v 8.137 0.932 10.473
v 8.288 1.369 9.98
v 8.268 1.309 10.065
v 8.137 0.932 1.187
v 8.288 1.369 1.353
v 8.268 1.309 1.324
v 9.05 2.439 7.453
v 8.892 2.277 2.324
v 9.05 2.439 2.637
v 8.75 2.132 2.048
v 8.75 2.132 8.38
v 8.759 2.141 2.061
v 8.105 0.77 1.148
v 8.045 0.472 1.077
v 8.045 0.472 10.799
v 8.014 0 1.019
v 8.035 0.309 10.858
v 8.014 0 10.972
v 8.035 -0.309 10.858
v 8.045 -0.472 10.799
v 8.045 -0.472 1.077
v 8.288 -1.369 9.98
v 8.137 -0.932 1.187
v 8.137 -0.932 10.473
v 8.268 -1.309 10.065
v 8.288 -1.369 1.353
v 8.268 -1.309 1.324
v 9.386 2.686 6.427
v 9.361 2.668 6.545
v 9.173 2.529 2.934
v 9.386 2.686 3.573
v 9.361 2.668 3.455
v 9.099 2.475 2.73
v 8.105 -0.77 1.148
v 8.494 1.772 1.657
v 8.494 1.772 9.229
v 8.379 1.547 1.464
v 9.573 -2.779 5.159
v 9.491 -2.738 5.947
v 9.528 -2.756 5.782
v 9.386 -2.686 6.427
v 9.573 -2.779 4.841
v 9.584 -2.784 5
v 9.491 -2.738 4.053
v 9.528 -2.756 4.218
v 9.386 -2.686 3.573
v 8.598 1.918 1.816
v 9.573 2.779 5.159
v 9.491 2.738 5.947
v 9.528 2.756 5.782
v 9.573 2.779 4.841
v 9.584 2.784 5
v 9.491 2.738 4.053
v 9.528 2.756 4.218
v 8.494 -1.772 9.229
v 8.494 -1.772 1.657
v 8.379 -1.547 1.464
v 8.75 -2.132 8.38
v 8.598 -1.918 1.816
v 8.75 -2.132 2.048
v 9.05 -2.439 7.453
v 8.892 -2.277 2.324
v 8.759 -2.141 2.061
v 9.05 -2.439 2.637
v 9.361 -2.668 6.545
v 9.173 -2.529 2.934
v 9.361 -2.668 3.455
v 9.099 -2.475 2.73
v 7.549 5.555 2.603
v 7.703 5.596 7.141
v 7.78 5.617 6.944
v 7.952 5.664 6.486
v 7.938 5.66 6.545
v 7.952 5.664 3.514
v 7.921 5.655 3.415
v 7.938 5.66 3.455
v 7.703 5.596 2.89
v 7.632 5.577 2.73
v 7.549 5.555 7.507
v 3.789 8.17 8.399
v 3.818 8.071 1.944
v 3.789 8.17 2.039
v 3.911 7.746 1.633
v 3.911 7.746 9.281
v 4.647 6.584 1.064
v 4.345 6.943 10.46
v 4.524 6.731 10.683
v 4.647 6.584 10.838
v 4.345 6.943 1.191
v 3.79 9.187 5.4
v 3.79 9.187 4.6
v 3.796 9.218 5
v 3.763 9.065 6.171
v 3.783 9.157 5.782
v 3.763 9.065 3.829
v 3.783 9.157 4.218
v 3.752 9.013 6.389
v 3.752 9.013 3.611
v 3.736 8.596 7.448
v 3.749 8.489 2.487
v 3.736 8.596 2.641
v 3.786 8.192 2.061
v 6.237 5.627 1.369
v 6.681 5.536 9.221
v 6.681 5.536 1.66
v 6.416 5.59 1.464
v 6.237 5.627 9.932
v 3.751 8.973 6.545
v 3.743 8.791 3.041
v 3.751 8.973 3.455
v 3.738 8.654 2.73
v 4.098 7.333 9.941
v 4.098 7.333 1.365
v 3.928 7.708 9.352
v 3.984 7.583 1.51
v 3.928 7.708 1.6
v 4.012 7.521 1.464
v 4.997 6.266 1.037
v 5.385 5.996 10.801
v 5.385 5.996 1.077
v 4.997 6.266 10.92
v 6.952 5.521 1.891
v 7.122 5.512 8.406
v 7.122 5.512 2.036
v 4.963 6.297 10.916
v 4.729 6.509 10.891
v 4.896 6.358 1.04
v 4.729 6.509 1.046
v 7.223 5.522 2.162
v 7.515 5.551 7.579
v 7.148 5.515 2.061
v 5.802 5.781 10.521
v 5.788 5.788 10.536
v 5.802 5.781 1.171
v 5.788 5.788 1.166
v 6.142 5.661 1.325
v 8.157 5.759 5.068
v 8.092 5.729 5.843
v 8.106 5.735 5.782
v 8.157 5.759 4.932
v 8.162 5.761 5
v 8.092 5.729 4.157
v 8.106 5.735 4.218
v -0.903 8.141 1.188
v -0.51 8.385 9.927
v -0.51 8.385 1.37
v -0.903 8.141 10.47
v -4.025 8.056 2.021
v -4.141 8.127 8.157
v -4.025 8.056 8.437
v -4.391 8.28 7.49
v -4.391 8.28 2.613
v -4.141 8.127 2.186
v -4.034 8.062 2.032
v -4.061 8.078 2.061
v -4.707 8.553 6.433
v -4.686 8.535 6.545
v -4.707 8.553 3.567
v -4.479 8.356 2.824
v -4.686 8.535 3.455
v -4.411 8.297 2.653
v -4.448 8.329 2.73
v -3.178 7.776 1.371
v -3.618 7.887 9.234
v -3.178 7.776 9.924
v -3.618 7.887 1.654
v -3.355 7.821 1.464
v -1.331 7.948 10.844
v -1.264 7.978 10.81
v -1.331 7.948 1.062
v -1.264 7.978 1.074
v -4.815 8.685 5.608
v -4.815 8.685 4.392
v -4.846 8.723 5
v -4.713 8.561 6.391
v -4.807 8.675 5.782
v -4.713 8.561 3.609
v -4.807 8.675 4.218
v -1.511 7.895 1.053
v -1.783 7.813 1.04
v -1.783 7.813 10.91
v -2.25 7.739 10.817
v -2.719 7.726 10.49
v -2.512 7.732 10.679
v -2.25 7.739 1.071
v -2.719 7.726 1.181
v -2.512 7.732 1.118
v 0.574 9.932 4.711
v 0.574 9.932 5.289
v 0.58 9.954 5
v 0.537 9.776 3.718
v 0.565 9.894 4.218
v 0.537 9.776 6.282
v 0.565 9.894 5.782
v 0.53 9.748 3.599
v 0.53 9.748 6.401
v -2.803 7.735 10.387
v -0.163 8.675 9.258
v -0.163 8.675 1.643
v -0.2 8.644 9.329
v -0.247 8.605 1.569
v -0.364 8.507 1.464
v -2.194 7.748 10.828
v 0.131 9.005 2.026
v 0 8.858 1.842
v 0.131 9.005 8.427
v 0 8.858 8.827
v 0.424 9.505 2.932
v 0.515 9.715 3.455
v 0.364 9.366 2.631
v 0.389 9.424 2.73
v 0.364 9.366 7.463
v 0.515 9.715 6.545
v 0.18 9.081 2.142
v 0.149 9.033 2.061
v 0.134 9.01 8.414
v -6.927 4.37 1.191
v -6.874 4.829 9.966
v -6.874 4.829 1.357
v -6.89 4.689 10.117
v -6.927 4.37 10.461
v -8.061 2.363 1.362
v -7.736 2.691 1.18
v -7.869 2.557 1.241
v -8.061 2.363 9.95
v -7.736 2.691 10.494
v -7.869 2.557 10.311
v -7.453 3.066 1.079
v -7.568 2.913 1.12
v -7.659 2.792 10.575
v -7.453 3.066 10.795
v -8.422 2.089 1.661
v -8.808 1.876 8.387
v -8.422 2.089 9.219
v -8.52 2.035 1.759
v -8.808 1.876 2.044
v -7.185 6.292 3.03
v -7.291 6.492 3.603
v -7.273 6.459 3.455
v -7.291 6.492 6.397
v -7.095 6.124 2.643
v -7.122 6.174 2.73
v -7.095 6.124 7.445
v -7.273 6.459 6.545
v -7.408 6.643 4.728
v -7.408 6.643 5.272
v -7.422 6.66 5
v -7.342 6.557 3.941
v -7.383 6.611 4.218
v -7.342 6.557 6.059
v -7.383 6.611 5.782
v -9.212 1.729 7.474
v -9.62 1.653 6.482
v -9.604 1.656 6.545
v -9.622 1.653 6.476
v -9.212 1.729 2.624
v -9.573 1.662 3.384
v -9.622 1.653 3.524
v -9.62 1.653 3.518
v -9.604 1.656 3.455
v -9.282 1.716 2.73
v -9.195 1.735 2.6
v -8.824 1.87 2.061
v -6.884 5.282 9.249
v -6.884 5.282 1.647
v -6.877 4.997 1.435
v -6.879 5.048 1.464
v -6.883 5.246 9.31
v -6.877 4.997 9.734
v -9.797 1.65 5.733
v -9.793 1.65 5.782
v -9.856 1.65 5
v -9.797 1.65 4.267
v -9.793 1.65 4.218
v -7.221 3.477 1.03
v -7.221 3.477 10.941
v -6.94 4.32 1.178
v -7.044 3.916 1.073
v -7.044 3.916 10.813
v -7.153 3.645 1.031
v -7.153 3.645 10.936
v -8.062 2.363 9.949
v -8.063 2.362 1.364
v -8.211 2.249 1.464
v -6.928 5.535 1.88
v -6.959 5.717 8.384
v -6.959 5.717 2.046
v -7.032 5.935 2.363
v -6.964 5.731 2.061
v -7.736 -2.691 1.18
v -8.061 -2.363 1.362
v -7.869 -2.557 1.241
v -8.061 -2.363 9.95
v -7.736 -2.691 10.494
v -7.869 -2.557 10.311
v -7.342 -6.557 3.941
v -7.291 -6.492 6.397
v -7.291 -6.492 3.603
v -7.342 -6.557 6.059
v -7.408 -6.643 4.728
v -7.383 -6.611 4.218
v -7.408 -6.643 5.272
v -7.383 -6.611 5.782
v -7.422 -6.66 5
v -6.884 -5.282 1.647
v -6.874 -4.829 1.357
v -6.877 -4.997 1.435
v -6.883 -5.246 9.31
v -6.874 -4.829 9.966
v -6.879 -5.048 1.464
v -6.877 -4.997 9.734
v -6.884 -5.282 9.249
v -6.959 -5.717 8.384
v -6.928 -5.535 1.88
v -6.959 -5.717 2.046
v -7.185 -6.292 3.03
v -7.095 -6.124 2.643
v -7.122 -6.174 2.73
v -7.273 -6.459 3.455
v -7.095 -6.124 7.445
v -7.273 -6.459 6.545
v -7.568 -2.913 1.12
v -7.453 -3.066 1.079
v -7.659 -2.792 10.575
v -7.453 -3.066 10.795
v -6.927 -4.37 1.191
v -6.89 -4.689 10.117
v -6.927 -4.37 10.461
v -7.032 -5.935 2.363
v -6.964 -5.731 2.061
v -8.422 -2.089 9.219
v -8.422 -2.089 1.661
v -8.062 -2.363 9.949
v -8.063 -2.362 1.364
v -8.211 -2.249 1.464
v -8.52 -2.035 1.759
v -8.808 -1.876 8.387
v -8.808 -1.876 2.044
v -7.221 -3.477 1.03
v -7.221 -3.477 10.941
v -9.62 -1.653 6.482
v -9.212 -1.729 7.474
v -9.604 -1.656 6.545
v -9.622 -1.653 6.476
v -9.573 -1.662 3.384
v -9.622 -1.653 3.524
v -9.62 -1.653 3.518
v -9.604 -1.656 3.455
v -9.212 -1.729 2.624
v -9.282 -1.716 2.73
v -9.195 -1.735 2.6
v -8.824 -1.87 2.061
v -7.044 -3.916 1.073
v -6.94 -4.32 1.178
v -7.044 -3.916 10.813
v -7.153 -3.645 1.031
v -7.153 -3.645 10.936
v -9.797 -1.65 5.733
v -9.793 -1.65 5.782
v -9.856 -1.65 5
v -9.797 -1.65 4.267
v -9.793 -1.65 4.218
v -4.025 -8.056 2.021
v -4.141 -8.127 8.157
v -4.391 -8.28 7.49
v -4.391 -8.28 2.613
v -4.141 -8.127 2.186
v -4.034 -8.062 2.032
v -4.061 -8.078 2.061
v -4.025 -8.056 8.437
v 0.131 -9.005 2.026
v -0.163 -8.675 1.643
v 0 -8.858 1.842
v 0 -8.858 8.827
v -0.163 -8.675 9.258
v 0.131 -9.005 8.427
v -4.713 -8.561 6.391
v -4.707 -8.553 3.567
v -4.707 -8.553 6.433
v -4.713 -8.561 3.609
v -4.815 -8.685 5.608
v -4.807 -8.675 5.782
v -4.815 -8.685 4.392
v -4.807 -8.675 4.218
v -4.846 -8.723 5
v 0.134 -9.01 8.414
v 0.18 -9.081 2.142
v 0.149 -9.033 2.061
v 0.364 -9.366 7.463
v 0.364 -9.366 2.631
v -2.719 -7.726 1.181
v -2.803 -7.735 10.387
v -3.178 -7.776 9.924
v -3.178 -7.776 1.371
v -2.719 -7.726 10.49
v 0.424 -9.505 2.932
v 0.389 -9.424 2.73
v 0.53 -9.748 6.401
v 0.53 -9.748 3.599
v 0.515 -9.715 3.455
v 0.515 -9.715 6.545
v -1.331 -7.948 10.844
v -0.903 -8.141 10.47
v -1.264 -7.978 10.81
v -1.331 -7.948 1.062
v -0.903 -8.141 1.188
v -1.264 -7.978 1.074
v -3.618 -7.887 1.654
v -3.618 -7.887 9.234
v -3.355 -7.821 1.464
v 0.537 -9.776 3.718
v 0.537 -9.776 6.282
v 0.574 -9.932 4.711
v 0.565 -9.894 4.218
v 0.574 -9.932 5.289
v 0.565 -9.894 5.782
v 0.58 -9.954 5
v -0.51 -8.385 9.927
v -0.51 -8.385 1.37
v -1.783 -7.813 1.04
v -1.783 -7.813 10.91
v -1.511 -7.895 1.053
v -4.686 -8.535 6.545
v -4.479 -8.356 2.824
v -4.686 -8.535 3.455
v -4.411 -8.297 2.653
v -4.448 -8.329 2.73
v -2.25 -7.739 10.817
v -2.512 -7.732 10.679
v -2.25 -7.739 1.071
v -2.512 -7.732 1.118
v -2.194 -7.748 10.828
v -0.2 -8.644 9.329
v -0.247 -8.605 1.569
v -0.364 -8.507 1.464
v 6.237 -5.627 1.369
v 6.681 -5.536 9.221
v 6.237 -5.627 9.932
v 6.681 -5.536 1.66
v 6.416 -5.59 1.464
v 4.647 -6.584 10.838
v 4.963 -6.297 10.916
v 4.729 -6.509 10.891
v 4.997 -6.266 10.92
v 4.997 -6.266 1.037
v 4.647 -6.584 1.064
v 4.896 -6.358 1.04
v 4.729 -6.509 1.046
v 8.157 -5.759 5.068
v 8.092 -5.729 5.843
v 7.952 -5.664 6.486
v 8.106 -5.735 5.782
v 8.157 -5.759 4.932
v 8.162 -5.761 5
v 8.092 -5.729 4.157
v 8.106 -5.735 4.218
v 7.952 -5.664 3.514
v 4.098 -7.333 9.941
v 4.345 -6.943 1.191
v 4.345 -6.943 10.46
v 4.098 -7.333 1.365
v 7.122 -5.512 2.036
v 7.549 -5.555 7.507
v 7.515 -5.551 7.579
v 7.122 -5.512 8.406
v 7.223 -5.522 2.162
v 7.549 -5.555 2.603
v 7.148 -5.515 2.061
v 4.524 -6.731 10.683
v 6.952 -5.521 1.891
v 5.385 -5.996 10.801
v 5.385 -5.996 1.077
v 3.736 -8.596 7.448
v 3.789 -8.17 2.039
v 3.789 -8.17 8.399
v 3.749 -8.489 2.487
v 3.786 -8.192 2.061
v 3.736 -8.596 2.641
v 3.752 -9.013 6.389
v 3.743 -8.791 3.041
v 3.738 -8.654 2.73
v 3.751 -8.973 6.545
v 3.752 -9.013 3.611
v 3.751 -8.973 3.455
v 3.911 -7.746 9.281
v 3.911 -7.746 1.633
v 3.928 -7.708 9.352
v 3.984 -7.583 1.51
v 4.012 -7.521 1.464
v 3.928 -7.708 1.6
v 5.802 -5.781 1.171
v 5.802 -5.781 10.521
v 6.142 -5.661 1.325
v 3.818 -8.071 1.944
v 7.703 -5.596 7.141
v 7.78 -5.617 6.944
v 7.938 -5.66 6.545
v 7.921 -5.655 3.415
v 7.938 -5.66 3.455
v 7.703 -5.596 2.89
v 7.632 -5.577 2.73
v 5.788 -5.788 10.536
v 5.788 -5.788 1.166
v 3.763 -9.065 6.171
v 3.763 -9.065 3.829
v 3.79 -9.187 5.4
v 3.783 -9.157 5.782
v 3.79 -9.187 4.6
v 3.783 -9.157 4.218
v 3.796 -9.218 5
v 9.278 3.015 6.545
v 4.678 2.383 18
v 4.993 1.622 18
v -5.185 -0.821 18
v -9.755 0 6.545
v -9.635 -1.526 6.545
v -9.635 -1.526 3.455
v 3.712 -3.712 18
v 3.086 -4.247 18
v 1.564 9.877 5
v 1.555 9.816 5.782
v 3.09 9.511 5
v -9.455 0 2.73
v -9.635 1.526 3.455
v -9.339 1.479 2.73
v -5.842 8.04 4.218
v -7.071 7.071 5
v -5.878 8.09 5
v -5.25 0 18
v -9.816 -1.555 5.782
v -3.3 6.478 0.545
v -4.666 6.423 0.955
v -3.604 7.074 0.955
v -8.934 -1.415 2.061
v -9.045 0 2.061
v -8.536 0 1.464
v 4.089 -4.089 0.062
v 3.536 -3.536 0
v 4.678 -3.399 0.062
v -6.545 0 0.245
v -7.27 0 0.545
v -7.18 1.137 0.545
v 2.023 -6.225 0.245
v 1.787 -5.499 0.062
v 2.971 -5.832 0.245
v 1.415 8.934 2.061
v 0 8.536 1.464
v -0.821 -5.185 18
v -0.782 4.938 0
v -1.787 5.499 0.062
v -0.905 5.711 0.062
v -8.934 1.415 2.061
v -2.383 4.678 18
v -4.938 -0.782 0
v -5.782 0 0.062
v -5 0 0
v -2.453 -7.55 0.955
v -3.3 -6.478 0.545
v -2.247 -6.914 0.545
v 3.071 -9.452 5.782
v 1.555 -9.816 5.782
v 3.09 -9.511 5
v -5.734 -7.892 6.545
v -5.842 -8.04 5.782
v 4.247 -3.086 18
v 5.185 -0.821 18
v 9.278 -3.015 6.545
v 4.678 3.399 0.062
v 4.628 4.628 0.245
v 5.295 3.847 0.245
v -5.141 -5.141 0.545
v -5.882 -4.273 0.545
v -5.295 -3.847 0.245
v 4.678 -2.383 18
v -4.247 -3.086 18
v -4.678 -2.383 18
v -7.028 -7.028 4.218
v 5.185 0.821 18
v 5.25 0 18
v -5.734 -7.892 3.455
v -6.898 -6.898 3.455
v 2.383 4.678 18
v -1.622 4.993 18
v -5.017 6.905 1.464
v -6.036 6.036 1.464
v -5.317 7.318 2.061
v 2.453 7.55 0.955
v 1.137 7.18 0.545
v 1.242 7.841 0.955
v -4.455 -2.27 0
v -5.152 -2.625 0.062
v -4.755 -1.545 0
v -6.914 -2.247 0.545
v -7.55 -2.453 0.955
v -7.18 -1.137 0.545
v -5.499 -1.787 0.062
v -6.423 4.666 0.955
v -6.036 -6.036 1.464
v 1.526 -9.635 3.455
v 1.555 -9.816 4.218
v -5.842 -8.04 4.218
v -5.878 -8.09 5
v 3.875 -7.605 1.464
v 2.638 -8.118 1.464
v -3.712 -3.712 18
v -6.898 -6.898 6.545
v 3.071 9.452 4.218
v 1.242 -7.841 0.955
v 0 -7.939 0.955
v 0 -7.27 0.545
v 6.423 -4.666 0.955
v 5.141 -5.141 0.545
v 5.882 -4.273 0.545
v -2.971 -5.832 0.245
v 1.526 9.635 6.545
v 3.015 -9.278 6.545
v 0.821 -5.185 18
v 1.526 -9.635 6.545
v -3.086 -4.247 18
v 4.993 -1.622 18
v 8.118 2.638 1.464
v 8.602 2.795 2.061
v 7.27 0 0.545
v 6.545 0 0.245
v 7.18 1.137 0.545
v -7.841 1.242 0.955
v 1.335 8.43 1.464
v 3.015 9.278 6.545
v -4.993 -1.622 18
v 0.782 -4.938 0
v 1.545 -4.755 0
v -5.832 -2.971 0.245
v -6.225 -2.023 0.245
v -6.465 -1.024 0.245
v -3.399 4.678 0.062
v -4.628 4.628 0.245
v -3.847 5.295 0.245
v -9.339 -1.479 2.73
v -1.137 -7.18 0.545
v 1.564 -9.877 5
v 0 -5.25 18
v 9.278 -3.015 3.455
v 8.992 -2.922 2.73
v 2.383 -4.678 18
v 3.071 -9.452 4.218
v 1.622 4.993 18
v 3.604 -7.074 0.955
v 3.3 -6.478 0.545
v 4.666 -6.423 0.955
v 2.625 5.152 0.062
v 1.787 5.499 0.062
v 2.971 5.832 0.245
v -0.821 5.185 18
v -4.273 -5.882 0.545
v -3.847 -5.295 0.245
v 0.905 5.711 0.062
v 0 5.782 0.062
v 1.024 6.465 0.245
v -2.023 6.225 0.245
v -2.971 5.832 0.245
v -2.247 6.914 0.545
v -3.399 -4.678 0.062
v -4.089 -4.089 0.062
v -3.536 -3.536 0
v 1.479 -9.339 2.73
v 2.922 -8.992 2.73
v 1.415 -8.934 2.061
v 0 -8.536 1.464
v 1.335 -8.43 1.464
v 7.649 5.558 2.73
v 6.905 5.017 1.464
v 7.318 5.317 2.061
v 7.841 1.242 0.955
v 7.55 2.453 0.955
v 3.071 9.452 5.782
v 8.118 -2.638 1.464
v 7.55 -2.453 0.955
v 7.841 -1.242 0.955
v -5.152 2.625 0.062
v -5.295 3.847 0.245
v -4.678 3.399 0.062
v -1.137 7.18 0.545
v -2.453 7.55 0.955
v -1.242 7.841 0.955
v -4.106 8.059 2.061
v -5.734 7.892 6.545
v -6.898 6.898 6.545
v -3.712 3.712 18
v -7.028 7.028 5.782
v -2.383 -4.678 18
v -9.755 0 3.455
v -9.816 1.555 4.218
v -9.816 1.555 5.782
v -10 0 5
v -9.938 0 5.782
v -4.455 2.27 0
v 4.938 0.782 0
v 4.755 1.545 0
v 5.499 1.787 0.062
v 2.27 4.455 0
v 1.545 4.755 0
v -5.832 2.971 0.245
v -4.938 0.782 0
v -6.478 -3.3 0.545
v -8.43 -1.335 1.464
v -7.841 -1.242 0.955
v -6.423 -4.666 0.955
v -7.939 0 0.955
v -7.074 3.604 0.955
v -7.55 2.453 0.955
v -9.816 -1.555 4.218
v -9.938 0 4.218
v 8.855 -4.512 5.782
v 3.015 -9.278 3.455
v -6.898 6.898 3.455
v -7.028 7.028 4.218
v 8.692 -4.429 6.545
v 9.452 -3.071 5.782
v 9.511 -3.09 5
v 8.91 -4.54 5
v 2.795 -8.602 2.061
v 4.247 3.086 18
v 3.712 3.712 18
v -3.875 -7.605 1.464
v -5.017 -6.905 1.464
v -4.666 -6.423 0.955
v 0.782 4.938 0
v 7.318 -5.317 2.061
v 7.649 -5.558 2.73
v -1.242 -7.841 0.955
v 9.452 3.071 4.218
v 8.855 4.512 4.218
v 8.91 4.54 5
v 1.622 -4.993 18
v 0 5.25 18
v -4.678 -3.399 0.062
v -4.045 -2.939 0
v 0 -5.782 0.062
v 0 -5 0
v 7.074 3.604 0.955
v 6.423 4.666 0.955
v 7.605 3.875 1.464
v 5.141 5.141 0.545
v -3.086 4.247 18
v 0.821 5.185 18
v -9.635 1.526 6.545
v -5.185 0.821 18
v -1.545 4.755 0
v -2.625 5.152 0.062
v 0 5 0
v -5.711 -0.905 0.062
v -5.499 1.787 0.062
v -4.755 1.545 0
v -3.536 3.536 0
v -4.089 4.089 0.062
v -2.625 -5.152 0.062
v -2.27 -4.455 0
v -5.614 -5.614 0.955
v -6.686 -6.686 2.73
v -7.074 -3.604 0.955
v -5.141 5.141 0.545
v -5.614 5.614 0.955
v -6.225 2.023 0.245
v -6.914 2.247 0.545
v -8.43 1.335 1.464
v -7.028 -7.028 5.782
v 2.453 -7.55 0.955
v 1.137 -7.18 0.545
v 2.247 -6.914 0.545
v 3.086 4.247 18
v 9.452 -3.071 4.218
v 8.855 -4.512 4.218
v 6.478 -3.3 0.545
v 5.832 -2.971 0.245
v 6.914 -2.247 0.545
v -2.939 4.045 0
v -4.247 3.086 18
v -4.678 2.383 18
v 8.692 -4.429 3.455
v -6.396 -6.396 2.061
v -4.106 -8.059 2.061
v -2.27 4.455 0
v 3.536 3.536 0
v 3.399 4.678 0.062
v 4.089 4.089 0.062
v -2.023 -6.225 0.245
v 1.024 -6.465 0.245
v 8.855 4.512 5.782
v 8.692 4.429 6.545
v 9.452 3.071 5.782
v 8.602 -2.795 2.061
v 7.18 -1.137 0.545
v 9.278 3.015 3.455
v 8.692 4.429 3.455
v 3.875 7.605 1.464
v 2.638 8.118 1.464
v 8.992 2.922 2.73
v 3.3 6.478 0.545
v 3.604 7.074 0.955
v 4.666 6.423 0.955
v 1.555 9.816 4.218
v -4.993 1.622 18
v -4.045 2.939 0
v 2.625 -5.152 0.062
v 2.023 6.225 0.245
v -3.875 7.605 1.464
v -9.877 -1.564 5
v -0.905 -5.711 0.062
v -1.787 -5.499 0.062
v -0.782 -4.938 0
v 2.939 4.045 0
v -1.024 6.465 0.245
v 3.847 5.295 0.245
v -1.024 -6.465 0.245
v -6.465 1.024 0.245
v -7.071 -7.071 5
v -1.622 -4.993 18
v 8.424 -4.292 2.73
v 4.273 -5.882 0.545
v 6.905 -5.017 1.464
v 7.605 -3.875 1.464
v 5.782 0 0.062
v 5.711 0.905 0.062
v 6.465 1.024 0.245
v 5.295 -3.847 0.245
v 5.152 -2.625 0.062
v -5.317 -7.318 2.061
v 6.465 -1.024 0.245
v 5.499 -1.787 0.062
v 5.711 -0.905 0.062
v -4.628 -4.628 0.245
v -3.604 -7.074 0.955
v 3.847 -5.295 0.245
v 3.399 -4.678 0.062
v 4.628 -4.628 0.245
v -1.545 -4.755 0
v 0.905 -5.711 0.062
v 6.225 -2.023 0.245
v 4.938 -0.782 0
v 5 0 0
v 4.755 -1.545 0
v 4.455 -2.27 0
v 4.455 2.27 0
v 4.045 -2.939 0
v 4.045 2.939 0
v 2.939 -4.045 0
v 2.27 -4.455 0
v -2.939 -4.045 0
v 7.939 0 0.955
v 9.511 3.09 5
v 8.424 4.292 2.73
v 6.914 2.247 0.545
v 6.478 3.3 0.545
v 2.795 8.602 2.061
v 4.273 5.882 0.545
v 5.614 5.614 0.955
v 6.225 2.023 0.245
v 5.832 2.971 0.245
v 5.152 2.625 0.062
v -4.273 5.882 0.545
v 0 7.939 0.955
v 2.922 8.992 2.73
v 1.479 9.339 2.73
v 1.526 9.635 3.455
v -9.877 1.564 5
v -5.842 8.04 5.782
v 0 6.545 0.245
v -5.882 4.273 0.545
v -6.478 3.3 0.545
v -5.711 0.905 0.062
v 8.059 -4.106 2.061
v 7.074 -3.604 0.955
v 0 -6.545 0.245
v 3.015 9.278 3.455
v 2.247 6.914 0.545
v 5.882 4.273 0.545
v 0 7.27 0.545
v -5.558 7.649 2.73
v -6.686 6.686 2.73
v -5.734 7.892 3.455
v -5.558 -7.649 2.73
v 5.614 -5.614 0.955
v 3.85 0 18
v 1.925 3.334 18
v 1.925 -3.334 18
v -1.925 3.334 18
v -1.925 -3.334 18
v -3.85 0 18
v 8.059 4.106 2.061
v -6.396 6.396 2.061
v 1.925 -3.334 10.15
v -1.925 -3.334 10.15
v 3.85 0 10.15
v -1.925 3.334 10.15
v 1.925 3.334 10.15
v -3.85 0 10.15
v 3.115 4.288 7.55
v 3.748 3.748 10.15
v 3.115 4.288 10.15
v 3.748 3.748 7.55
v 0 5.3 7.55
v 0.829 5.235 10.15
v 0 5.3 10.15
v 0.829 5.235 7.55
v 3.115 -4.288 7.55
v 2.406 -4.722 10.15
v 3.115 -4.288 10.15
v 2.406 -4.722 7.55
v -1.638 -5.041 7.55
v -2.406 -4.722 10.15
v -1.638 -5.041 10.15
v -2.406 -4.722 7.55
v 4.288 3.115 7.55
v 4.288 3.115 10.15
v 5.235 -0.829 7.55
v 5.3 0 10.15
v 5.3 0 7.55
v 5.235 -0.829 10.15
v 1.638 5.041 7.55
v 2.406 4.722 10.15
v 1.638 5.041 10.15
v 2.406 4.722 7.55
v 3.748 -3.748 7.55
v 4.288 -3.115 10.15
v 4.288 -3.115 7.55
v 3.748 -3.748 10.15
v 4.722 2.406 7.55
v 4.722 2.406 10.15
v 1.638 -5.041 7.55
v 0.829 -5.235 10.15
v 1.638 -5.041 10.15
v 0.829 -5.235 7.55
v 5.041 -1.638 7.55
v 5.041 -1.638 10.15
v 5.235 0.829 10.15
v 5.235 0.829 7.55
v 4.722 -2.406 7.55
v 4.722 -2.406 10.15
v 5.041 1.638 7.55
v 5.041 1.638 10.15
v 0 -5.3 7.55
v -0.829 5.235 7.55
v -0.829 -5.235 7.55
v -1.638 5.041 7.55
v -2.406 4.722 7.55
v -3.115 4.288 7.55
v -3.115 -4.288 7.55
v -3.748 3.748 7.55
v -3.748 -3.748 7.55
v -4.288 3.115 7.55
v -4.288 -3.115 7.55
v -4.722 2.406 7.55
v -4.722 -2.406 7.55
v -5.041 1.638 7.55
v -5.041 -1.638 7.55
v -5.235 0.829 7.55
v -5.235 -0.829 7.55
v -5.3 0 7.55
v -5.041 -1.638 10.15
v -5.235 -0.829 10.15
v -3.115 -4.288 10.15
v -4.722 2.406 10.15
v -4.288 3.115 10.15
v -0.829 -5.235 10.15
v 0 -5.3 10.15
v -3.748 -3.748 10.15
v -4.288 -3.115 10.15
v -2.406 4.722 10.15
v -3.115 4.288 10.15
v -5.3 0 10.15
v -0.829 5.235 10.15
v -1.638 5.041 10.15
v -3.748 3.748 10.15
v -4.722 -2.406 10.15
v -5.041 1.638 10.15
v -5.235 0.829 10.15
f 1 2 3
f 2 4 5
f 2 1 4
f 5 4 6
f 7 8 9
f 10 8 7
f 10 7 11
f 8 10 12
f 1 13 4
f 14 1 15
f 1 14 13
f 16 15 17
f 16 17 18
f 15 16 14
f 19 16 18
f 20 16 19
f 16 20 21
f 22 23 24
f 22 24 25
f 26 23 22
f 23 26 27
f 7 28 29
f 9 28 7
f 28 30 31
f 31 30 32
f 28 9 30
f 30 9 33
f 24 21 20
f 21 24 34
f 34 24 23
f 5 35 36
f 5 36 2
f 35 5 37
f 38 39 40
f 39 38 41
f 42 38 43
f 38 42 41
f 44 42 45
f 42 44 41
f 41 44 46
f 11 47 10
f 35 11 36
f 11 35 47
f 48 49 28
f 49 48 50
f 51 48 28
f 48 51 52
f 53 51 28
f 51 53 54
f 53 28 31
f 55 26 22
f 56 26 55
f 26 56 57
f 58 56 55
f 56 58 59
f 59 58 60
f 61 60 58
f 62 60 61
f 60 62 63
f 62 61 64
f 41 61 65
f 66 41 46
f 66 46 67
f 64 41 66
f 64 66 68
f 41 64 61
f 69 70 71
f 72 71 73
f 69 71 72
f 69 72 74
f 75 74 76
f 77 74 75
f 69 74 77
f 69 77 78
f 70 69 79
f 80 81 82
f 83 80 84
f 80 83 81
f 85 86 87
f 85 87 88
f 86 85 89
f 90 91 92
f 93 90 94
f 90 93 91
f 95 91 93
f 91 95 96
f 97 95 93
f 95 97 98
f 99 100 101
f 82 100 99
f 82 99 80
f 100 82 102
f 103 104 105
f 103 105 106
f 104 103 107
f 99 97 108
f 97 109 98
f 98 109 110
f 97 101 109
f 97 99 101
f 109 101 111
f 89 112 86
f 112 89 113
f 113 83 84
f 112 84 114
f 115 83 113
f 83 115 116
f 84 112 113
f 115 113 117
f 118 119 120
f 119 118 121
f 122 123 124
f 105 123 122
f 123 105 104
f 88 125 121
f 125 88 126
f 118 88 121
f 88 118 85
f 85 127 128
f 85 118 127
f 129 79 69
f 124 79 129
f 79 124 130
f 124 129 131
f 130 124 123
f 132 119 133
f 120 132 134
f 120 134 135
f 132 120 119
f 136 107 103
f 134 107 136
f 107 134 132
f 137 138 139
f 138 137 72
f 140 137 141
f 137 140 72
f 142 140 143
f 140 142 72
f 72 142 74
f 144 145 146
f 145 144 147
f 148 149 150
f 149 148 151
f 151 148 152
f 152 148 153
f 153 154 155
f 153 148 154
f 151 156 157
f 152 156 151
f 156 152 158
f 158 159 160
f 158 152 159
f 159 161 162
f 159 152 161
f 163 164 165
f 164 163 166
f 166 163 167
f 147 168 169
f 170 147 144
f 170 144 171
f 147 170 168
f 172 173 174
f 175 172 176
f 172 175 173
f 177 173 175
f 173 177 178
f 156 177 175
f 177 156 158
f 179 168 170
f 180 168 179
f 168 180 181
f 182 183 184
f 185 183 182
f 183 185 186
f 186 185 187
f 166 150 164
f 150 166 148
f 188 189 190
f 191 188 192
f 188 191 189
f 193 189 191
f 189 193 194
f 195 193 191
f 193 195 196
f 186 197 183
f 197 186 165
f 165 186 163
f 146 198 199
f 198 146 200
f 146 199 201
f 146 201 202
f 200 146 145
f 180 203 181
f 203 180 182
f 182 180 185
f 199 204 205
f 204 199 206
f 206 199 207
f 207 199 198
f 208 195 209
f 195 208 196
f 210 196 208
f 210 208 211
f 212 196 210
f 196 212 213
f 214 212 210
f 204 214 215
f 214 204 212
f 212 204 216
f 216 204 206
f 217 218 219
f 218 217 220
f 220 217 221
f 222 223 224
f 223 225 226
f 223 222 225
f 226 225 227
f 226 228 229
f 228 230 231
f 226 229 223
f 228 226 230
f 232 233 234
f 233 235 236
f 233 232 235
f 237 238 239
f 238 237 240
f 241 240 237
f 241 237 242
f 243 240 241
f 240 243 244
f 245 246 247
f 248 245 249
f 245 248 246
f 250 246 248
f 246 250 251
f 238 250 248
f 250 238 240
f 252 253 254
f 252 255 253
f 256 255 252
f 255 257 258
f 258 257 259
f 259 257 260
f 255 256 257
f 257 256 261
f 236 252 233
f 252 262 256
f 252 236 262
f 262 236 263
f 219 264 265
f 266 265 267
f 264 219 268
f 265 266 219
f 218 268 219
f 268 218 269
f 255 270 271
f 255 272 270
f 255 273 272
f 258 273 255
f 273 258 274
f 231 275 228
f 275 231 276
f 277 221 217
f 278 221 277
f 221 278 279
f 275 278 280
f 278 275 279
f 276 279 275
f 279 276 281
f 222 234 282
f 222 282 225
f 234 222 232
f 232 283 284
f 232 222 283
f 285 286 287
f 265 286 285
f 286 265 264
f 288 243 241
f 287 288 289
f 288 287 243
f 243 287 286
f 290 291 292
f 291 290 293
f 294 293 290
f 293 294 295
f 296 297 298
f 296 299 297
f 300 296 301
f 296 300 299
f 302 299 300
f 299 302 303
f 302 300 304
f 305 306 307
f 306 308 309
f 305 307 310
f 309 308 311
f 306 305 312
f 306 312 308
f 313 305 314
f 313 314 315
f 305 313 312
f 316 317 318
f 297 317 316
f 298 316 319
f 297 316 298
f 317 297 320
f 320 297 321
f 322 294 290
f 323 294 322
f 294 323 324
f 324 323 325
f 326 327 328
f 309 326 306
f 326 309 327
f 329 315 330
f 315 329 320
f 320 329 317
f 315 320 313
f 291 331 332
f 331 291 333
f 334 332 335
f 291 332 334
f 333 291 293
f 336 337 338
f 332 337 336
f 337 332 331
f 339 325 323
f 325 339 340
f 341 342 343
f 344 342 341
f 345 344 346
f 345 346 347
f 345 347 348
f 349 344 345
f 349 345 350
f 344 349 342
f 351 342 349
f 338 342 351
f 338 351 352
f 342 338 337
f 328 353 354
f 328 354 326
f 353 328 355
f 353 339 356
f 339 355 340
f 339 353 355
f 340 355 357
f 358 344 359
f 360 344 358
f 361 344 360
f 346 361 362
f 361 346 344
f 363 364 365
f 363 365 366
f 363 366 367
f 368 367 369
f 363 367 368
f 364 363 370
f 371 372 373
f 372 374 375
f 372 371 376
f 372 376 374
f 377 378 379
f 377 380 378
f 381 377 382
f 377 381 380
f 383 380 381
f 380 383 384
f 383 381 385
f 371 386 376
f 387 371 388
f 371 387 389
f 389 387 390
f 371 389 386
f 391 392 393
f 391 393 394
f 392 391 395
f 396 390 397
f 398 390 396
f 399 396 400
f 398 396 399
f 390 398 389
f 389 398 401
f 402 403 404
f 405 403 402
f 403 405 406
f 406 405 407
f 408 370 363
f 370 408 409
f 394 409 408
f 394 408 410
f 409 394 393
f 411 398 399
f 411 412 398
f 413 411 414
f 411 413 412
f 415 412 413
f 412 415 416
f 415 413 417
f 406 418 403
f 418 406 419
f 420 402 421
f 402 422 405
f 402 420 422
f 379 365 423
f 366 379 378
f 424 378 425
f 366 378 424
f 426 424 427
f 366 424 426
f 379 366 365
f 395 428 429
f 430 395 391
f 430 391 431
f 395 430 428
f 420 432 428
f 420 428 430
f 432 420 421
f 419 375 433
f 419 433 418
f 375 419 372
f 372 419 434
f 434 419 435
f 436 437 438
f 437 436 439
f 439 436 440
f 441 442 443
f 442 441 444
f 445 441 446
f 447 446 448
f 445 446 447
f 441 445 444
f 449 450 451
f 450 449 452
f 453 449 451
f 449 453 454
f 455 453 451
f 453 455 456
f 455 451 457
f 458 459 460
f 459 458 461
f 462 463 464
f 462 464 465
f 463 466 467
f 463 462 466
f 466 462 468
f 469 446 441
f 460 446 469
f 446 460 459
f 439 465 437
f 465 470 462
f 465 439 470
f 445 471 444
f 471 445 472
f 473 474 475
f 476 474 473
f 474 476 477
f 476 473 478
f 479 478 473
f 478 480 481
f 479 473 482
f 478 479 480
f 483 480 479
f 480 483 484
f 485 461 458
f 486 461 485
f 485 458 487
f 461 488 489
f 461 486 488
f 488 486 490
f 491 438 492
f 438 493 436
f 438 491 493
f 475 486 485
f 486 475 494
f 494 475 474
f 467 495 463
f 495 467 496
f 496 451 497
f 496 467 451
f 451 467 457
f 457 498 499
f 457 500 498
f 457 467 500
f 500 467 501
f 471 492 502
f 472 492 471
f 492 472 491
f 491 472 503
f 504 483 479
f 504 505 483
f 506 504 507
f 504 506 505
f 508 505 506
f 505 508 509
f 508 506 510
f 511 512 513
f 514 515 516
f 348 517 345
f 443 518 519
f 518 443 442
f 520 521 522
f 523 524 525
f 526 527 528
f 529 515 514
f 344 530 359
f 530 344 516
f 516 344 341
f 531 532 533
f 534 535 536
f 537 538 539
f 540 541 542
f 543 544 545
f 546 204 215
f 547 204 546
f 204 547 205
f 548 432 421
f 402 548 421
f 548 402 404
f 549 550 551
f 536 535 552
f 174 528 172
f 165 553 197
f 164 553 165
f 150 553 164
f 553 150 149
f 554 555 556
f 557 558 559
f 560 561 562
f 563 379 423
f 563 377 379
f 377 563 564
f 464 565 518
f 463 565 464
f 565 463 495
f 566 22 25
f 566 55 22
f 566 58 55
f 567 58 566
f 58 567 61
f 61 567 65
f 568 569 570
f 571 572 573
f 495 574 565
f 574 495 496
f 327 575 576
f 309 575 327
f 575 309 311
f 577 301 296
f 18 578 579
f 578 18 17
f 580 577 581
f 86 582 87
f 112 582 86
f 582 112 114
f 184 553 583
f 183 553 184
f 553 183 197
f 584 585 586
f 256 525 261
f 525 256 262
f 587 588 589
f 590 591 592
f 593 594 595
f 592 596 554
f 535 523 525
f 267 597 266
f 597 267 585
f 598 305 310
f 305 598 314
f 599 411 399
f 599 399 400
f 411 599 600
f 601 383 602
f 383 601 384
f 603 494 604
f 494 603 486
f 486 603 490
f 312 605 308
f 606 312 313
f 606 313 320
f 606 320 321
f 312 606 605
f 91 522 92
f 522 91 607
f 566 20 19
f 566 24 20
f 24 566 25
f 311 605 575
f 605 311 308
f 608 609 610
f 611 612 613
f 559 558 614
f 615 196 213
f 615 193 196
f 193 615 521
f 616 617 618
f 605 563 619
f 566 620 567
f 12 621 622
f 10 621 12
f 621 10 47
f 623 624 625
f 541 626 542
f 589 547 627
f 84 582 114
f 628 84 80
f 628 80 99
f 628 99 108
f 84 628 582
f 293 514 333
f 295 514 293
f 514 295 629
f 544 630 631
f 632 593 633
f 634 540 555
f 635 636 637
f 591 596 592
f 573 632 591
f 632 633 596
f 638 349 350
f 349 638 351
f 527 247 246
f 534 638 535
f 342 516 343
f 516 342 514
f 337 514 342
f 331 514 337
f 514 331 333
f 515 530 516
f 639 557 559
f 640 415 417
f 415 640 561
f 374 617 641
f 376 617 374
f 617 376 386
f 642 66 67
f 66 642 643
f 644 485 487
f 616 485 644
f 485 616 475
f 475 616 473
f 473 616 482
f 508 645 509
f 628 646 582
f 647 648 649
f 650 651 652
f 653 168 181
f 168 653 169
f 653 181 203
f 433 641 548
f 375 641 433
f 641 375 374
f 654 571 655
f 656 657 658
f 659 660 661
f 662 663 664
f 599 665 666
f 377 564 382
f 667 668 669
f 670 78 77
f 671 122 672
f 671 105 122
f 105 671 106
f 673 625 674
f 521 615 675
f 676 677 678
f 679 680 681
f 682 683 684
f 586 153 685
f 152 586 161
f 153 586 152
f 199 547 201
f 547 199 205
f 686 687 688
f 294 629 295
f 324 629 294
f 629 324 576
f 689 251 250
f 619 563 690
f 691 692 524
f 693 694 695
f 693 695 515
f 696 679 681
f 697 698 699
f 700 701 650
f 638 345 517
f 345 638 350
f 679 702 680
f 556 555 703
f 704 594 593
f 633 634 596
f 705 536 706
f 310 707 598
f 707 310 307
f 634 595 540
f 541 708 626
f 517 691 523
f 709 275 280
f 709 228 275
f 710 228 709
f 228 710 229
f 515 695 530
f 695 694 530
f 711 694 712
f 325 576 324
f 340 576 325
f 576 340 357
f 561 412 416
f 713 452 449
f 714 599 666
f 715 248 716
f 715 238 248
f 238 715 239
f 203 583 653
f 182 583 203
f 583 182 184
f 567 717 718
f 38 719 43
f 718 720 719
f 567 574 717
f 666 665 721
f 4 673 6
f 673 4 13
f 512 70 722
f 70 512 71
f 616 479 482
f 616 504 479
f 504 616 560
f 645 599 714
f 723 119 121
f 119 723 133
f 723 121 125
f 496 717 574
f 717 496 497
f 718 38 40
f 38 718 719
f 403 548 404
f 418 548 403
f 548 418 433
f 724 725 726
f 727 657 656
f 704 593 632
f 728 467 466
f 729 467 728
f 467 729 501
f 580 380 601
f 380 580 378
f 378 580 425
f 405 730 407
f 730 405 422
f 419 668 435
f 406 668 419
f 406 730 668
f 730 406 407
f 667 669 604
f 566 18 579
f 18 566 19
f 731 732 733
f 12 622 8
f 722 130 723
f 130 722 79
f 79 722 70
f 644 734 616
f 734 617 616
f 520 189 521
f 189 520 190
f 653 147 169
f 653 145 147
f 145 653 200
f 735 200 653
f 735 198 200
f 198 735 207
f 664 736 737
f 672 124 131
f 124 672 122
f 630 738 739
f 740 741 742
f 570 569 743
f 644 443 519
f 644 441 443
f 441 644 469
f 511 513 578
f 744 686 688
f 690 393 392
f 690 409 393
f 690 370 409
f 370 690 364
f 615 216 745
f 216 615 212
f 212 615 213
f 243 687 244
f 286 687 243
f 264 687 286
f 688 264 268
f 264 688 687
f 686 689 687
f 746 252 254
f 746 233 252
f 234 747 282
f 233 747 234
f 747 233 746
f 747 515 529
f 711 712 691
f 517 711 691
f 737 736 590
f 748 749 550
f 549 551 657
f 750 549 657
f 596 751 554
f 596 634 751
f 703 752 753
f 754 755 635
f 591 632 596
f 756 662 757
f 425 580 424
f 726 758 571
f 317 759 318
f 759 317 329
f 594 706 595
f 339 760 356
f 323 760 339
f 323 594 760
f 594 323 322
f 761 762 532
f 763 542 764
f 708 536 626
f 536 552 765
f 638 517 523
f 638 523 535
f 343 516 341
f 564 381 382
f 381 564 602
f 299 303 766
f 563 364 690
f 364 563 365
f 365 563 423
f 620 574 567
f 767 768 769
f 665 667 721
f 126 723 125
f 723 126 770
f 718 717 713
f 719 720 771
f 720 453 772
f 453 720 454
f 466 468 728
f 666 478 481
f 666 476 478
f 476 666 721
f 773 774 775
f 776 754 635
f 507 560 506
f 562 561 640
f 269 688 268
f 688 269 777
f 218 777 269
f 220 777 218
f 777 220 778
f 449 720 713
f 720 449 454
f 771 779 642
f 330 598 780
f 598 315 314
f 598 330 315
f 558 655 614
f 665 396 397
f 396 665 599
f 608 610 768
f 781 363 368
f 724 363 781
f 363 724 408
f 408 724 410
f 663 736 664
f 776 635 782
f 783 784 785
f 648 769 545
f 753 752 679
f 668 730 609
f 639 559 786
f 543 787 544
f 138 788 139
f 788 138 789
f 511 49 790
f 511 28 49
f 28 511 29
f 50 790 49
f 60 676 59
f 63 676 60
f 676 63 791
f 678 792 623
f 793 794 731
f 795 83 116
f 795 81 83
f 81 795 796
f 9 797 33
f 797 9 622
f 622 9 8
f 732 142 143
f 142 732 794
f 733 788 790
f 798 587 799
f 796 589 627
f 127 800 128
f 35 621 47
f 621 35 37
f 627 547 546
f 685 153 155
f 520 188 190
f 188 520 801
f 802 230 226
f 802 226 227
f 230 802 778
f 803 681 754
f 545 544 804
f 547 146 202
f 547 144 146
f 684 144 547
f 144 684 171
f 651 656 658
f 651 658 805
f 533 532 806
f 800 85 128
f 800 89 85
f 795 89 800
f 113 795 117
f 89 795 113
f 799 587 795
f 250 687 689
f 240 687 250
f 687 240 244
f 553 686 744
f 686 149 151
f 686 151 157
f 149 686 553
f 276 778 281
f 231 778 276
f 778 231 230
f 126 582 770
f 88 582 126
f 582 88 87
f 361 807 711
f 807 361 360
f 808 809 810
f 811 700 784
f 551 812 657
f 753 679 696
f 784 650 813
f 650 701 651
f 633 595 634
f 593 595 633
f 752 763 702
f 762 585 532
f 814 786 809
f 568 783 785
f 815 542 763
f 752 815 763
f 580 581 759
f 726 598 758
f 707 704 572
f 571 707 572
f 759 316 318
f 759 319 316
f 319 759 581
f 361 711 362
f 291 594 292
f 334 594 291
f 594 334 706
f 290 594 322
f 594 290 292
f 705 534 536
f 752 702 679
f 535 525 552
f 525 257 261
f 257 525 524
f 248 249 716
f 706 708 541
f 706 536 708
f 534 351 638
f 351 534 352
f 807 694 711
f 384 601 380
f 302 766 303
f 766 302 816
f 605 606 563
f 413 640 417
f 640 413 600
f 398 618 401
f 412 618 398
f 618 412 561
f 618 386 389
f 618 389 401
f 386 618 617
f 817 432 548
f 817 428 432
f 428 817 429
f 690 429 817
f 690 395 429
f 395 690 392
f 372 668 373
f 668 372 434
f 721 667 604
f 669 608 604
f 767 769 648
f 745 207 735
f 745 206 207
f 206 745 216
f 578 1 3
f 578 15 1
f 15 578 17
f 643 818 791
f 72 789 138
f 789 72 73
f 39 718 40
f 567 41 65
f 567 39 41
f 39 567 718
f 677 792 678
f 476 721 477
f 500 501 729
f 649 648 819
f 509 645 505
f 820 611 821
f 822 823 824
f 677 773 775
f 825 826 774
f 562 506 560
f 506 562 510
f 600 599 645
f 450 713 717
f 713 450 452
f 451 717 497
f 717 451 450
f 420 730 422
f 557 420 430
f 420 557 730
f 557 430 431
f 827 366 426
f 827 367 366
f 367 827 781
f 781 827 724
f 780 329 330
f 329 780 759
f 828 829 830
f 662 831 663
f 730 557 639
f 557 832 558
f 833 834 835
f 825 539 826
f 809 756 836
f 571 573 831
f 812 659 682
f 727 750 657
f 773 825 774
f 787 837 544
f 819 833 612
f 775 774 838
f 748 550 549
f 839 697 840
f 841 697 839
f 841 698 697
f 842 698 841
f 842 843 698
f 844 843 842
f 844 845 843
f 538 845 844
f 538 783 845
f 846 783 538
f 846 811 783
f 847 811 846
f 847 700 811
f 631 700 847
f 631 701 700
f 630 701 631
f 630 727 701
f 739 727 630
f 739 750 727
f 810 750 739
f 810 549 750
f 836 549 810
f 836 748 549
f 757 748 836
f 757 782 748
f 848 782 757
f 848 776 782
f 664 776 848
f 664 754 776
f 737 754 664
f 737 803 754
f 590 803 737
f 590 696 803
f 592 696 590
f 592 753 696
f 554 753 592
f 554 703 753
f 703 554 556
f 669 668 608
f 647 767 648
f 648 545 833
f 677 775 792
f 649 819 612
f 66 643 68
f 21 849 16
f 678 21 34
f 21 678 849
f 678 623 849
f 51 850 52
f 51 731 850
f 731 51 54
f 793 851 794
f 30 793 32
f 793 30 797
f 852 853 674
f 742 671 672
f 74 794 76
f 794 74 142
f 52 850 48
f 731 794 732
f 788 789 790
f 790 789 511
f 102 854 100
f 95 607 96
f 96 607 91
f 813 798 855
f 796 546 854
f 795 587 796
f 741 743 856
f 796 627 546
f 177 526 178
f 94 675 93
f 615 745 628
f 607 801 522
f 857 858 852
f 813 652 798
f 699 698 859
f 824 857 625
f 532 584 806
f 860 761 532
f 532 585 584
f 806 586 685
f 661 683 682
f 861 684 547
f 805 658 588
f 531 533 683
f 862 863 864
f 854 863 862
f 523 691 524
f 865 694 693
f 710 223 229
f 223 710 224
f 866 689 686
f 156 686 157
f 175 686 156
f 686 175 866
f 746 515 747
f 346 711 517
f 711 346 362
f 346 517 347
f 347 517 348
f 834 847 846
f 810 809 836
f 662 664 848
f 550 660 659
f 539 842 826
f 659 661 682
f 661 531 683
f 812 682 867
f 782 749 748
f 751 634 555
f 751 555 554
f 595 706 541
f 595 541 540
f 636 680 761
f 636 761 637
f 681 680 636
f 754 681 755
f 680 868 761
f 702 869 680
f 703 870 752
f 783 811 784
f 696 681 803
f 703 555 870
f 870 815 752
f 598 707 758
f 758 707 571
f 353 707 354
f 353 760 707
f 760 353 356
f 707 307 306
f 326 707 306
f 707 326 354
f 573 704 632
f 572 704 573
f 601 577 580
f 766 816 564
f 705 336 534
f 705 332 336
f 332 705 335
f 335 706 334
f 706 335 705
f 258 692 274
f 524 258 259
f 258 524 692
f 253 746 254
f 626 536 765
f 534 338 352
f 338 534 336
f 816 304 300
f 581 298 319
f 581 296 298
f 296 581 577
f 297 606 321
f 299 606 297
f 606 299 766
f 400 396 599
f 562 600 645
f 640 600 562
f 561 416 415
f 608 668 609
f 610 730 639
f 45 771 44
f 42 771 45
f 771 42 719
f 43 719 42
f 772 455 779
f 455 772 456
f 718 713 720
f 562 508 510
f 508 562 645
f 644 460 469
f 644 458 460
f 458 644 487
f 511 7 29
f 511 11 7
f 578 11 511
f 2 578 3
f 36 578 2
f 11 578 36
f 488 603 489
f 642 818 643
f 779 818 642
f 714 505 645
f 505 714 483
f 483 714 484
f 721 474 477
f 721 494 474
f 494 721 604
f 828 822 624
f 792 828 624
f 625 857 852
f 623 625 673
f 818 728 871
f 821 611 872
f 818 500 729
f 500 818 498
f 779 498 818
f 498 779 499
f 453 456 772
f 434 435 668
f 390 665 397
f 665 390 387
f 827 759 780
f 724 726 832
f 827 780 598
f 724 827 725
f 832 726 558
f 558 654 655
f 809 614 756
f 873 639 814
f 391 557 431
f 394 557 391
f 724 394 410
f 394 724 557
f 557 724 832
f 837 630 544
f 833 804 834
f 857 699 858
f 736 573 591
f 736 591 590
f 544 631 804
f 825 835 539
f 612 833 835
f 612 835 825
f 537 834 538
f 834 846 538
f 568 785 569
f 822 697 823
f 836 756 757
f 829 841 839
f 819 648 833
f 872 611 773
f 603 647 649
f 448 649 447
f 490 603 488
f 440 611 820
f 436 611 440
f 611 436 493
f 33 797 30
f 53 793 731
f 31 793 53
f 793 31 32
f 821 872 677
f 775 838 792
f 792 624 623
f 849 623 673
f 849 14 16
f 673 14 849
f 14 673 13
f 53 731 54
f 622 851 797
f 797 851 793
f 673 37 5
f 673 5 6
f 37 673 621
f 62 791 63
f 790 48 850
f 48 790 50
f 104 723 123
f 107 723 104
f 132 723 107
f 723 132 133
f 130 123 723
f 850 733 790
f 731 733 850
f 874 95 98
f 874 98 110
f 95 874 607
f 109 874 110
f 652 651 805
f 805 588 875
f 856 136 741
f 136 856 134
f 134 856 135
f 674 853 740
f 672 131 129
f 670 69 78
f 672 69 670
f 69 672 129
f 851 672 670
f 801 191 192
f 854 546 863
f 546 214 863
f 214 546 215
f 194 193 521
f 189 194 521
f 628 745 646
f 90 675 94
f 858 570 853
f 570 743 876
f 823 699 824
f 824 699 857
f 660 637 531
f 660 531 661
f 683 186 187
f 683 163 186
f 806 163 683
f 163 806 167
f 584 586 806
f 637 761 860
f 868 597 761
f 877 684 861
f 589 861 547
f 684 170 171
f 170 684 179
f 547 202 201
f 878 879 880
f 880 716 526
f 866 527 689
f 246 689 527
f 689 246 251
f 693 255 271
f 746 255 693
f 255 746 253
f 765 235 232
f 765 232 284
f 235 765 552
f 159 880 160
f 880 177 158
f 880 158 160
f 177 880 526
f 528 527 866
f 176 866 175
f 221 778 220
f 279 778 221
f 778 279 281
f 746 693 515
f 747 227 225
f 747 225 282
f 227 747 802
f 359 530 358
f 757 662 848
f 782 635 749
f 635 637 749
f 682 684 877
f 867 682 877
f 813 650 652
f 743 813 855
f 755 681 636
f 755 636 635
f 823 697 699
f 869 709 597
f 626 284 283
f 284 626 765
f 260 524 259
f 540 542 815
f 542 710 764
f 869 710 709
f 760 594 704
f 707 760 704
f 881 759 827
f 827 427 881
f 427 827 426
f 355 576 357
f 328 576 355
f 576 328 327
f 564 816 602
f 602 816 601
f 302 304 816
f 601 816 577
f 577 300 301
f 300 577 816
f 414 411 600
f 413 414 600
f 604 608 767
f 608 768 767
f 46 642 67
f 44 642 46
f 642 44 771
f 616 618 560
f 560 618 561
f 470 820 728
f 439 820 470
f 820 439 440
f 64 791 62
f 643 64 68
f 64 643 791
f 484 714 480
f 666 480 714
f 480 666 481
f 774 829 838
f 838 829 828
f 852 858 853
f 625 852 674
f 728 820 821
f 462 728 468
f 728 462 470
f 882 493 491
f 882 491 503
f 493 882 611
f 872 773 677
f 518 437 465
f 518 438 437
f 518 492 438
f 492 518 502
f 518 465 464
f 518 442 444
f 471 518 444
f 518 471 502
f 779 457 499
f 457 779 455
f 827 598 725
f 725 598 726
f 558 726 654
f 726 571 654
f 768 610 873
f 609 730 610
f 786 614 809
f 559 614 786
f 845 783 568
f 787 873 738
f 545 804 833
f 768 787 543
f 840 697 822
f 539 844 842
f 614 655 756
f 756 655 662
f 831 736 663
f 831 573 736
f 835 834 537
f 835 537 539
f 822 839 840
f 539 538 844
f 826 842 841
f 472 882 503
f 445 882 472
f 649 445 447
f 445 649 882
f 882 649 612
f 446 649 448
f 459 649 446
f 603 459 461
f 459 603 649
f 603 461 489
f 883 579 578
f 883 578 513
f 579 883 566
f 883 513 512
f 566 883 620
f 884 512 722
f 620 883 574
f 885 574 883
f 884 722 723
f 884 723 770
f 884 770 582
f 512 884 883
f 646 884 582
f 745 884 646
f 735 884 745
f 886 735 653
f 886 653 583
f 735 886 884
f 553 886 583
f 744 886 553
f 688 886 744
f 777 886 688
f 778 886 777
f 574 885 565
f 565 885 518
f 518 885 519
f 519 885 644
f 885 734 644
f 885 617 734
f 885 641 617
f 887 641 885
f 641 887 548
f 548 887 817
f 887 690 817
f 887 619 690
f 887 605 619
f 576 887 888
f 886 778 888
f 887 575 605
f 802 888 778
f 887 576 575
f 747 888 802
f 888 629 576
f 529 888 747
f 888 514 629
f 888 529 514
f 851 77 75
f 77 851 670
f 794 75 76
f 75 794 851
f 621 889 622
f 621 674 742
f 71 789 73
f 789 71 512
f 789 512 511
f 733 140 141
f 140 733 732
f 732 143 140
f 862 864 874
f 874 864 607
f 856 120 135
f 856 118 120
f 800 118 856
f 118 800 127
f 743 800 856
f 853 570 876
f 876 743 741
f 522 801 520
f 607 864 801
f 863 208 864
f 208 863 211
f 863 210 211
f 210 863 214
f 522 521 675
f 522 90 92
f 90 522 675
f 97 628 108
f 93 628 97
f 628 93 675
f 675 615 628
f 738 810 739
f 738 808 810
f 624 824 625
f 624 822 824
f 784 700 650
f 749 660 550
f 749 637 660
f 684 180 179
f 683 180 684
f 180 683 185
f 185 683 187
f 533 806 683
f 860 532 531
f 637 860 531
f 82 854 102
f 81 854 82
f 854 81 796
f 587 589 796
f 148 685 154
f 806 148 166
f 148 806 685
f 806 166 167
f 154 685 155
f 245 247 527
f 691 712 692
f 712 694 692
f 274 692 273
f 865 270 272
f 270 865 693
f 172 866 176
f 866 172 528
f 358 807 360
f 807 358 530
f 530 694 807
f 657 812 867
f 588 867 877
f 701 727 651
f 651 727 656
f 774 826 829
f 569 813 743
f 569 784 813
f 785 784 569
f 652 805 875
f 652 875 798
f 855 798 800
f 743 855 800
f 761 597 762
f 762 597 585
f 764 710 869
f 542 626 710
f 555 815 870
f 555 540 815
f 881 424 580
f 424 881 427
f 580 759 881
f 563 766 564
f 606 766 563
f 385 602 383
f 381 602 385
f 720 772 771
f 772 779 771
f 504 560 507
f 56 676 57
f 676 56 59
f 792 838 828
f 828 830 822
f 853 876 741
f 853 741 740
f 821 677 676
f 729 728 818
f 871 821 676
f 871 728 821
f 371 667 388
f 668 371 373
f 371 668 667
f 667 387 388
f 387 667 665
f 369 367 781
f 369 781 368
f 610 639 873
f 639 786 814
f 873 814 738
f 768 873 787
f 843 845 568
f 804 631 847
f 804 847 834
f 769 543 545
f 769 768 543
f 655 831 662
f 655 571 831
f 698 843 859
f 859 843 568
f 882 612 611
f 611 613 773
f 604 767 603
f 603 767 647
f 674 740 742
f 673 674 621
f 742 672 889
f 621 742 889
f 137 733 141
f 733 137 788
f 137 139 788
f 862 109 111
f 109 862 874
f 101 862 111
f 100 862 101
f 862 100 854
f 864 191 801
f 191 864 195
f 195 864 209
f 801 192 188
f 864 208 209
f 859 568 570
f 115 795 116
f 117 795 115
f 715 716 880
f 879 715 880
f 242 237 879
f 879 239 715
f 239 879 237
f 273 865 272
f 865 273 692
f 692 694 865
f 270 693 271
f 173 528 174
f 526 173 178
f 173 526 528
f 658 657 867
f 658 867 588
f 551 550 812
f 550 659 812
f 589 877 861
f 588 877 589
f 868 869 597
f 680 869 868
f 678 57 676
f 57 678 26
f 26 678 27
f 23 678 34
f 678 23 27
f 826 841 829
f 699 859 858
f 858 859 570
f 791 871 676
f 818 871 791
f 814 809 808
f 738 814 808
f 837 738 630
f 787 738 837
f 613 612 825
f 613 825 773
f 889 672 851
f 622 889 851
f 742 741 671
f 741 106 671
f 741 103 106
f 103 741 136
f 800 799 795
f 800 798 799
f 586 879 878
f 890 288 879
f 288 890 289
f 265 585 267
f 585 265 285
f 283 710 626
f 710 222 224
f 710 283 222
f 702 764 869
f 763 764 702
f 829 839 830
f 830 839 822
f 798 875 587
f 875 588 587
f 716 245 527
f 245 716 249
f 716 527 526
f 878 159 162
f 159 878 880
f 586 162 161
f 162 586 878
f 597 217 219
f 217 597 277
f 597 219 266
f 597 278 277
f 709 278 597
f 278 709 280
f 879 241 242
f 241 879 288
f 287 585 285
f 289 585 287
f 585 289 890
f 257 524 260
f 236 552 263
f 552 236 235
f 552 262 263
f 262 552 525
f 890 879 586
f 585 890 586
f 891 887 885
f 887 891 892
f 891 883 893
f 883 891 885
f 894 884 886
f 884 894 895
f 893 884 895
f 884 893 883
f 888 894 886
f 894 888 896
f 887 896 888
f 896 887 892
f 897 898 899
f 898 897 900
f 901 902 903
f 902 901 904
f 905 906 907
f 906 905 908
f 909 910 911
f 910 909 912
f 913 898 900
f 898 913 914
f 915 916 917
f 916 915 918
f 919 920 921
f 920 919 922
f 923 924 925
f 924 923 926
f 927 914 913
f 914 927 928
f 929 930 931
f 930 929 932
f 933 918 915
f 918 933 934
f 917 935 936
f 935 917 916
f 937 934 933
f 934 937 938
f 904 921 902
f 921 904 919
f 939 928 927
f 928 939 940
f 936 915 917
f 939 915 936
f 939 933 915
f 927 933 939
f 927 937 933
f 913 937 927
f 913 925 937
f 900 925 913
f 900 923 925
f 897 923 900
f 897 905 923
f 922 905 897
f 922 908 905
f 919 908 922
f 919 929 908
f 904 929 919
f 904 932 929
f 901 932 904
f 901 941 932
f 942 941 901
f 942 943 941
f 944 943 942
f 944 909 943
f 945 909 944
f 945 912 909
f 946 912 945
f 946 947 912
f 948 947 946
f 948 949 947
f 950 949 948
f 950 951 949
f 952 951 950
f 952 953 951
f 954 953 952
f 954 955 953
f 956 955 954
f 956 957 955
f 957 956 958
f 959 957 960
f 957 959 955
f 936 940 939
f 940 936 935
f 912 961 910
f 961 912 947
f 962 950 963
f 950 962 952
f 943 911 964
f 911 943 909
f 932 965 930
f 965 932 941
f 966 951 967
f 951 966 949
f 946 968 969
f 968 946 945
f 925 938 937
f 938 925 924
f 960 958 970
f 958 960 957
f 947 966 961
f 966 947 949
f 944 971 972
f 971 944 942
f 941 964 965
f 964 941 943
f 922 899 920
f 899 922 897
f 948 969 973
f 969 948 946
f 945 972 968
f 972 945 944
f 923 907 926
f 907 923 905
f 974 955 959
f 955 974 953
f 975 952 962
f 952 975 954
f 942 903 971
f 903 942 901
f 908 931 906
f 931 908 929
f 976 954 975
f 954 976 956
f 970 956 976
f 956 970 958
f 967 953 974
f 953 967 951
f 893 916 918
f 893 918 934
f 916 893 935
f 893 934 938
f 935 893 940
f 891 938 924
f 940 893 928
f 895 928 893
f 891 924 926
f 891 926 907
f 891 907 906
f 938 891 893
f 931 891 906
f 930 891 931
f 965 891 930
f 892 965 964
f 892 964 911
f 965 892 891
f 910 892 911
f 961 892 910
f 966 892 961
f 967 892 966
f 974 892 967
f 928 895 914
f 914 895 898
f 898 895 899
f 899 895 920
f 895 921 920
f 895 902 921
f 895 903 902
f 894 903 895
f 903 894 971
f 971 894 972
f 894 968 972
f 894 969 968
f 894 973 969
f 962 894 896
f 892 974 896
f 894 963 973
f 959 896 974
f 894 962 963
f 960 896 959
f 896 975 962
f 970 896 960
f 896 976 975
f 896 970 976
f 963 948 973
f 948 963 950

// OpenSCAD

/* [Handle settings] */
//screwriver height
sdh=18;//[18:1:100]

//screwdriver diameter
sdd=20;//[20:0.5:50]

/* [Magnet settings] */
//magnet option
mo=1;//[0:No,1:Yes]

//magnet shape
mshape=0;//[0:round,1:square]

//magnet size (square side or circle diameter)
msize=10;//[5:0.5:10]

//magnet thickness
mt=2;//[1:0.5:6]

/* [Tuning] */
definition=40;//[40:Low,70:Medium,100:High]
//positve value will add gaps for bit and magnet
tolerance=0.15;
/////////

$fn=definition;

//screwdriver
module screwdriver(a){
    difference() {
        rotate([180,0,0])rotate_extrude() rotate([0,0,-90])
        hull() {
            translate([sdh-5.25,0,0]) square(5.25);
            square(1);
            translate([5,sdd/2-5,0]) circle(5);
            translate([sdh-13,sdd/2-5,0]) circle(5);
        }
        for(i=[0:360/7:360]) rotate([0,0,i]) translate([sdd/1.9,0,0]) scale([1,1.2,1]) cylinder(d=2*3.14*sdd/25,h=sdh);
            translate([0,0,sdh-0.2]) cylinder(d=7.4+2*tolerance,h=16,center=true,$fn=6);
        
        //magnet option
        translate([0,0,sdh-8-mt/2-tolerance]) if(a==1) {
            if(mshape==0) {
                cylinder(d=msize+4*tolerance,h=mt+4*tolerance,center=true);
            }
            else if(mshape==1) {
                cube([msize+4*tolerance,msize+4*tolerance,mt+2*tolerance],center=true);
            }
        }
        else {}
    }

}
screwdriver(mo);
